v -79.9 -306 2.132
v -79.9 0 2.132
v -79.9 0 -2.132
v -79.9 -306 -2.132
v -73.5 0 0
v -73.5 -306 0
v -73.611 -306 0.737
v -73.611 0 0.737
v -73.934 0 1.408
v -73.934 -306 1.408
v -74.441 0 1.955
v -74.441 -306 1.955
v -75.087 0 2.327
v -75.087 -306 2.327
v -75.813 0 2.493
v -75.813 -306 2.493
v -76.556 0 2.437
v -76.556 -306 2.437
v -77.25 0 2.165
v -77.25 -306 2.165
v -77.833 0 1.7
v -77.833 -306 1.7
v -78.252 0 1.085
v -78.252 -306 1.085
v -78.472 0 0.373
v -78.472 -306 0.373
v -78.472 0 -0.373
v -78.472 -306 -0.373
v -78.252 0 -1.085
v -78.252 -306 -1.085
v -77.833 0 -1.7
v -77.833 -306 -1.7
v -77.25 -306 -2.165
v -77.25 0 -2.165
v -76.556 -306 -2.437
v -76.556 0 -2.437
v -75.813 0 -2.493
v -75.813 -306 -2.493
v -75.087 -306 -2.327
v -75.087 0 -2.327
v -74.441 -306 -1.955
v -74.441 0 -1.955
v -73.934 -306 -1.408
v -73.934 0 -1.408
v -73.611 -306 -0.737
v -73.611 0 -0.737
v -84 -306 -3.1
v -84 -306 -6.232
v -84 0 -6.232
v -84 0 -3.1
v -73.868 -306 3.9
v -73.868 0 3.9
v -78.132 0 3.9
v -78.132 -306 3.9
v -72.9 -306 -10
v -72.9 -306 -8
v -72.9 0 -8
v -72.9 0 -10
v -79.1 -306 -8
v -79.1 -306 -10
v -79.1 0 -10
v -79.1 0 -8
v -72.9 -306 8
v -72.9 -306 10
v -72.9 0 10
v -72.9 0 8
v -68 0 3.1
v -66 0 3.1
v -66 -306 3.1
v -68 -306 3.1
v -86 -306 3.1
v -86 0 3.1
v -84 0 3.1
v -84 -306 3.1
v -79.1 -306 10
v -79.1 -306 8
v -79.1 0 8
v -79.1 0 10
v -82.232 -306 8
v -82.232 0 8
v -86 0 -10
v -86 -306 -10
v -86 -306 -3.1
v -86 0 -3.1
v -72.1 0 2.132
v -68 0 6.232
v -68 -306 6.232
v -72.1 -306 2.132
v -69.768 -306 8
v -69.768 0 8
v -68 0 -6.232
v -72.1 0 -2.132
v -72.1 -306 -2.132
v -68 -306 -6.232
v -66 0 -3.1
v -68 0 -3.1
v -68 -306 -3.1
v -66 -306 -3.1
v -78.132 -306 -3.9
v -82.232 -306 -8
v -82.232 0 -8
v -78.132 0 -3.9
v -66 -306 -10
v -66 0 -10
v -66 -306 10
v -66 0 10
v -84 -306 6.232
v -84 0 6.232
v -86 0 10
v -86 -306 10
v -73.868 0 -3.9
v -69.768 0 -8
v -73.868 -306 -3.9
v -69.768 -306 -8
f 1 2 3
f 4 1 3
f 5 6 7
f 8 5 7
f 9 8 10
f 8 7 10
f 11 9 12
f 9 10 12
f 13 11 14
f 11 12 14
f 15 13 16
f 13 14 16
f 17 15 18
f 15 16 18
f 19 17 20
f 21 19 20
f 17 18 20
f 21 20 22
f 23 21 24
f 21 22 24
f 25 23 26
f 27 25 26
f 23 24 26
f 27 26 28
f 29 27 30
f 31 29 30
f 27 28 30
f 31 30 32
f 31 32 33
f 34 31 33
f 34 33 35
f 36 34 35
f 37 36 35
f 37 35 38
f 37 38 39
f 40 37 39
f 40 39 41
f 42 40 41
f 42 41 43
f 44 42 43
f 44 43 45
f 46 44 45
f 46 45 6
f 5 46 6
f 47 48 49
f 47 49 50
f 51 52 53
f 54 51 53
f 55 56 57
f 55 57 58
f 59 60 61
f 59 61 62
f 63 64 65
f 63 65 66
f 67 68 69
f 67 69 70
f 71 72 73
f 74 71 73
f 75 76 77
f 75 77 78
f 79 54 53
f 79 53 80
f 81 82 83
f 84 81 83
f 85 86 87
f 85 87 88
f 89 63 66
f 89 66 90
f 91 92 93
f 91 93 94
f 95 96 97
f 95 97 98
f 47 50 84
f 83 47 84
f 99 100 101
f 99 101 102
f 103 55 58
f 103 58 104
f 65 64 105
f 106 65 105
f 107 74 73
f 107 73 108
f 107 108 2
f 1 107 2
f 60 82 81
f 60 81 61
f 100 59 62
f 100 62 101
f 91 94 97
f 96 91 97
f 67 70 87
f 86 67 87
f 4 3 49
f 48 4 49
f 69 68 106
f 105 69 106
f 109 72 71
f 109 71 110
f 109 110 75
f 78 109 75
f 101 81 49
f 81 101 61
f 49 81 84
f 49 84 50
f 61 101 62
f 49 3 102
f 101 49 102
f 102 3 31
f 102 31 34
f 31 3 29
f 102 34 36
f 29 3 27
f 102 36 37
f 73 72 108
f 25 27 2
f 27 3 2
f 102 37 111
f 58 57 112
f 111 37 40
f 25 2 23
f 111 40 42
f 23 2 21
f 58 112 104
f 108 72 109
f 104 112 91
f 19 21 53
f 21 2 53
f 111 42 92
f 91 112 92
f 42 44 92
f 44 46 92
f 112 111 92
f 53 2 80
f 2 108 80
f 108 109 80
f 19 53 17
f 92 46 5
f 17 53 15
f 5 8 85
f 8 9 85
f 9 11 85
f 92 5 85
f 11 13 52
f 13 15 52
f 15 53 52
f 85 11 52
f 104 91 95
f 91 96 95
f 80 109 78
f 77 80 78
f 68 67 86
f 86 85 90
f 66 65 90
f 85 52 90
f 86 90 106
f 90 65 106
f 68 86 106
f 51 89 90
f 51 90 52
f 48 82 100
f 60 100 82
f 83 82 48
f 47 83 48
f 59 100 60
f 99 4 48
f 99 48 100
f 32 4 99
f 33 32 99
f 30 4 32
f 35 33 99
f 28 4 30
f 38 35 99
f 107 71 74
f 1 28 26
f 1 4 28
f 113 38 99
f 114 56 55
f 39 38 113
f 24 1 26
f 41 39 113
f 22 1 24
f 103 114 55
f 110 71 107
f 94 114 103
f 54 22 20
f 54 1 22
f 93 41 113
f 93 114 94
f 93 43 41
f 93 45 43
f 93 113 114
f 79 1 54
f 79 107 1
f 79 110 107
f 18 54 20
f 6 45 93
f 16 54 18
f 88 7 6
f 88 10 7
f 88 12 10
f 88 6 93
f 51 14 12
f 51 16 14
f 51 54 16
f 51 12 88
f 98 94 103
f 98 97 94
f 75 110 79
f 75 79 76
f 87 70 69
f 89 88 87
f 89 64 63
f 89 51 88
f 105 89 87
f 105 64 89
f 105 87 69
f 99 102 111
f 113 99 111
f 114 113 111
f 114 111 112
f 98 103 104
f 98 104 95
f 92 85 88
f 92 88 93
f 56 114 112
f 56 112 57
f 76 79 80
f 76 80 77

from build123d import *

# Parameters (mm, degrees)
SKETCH_W             = 20
SKETCH_H             = 20
PAD_DEPTH            = 306
SKETCH001_R          = 2.5
POCKET_DEPTH         = 306.001
POCKET001_DEPTH      = 306.001
BODY_PLACEMENT_ANGLE = 90


with BuildPart() as part:
    # Sketch → Pad (new body)
    with BuildSketch(Plane.XY):
        Rectangle(SKETCH_W, SKETCH_H)
    extrude(amount=PAD_DEPTH)

    # Sketch001 (on Face6 of Pad) → Pocket (cut, through all)
    with BuildSketch(Plane.XY.offset(306)):
        Circle(SKETCH001_R)
        Polygon((-3.1, 10), (3.1, 10), (3.1, 8), (6.232233, 8), (2.132233, 3.9), (-2.132233, 3.9), (-6.232233, 8), (-3.1, 8), align=None)
        Polygon((-3.1, -8), (-6.232233, -8), (-2.132233, -3.9), (2.132233, -3.9), (6.232233, -8), (3.1, -8), (3.1, -10), (-3.1, -10), align=None)
    extrude(amount=-POCKET_DEPTH, mode=Mode.SUBTRACT)

    # Sketch002 (on Face2 of Pocket) → Pocket001 (cut, through all)
    with BuildSketch(Plane(origin=(0, 0, 0), x_dir=(1, 0, 0), z_dir=(0, 0, -1))):
        Polygon((-10, -3.1), (-8, -3.1), (-8, -6.232233), (-3.9, -2.132233), (-3.9, 2.132233), (-8, 6.232233), (-8, 3.1), (-10, 3.1), align=None)
        Polygon((3.9, -2.132233), (3.9, 2.132233), (8, 6.232233), (8, 3.1), (10, 3.1), (10, -3.1), (8, -3.1), (8, -6.232233), align=None)
    extrude(amount=-POCKET001_DEPTH, mode=Mode.SUBTRACT)


with BuildPart() as part_1:
    # Body placement: moved
    add(part.part.moved(Location((-76, 0, 0))).rotate(Axis((-76, 0, 0), (1, 0, 0)), BODY_PLACEMENT_ANGLE))


solid = part_1.part
